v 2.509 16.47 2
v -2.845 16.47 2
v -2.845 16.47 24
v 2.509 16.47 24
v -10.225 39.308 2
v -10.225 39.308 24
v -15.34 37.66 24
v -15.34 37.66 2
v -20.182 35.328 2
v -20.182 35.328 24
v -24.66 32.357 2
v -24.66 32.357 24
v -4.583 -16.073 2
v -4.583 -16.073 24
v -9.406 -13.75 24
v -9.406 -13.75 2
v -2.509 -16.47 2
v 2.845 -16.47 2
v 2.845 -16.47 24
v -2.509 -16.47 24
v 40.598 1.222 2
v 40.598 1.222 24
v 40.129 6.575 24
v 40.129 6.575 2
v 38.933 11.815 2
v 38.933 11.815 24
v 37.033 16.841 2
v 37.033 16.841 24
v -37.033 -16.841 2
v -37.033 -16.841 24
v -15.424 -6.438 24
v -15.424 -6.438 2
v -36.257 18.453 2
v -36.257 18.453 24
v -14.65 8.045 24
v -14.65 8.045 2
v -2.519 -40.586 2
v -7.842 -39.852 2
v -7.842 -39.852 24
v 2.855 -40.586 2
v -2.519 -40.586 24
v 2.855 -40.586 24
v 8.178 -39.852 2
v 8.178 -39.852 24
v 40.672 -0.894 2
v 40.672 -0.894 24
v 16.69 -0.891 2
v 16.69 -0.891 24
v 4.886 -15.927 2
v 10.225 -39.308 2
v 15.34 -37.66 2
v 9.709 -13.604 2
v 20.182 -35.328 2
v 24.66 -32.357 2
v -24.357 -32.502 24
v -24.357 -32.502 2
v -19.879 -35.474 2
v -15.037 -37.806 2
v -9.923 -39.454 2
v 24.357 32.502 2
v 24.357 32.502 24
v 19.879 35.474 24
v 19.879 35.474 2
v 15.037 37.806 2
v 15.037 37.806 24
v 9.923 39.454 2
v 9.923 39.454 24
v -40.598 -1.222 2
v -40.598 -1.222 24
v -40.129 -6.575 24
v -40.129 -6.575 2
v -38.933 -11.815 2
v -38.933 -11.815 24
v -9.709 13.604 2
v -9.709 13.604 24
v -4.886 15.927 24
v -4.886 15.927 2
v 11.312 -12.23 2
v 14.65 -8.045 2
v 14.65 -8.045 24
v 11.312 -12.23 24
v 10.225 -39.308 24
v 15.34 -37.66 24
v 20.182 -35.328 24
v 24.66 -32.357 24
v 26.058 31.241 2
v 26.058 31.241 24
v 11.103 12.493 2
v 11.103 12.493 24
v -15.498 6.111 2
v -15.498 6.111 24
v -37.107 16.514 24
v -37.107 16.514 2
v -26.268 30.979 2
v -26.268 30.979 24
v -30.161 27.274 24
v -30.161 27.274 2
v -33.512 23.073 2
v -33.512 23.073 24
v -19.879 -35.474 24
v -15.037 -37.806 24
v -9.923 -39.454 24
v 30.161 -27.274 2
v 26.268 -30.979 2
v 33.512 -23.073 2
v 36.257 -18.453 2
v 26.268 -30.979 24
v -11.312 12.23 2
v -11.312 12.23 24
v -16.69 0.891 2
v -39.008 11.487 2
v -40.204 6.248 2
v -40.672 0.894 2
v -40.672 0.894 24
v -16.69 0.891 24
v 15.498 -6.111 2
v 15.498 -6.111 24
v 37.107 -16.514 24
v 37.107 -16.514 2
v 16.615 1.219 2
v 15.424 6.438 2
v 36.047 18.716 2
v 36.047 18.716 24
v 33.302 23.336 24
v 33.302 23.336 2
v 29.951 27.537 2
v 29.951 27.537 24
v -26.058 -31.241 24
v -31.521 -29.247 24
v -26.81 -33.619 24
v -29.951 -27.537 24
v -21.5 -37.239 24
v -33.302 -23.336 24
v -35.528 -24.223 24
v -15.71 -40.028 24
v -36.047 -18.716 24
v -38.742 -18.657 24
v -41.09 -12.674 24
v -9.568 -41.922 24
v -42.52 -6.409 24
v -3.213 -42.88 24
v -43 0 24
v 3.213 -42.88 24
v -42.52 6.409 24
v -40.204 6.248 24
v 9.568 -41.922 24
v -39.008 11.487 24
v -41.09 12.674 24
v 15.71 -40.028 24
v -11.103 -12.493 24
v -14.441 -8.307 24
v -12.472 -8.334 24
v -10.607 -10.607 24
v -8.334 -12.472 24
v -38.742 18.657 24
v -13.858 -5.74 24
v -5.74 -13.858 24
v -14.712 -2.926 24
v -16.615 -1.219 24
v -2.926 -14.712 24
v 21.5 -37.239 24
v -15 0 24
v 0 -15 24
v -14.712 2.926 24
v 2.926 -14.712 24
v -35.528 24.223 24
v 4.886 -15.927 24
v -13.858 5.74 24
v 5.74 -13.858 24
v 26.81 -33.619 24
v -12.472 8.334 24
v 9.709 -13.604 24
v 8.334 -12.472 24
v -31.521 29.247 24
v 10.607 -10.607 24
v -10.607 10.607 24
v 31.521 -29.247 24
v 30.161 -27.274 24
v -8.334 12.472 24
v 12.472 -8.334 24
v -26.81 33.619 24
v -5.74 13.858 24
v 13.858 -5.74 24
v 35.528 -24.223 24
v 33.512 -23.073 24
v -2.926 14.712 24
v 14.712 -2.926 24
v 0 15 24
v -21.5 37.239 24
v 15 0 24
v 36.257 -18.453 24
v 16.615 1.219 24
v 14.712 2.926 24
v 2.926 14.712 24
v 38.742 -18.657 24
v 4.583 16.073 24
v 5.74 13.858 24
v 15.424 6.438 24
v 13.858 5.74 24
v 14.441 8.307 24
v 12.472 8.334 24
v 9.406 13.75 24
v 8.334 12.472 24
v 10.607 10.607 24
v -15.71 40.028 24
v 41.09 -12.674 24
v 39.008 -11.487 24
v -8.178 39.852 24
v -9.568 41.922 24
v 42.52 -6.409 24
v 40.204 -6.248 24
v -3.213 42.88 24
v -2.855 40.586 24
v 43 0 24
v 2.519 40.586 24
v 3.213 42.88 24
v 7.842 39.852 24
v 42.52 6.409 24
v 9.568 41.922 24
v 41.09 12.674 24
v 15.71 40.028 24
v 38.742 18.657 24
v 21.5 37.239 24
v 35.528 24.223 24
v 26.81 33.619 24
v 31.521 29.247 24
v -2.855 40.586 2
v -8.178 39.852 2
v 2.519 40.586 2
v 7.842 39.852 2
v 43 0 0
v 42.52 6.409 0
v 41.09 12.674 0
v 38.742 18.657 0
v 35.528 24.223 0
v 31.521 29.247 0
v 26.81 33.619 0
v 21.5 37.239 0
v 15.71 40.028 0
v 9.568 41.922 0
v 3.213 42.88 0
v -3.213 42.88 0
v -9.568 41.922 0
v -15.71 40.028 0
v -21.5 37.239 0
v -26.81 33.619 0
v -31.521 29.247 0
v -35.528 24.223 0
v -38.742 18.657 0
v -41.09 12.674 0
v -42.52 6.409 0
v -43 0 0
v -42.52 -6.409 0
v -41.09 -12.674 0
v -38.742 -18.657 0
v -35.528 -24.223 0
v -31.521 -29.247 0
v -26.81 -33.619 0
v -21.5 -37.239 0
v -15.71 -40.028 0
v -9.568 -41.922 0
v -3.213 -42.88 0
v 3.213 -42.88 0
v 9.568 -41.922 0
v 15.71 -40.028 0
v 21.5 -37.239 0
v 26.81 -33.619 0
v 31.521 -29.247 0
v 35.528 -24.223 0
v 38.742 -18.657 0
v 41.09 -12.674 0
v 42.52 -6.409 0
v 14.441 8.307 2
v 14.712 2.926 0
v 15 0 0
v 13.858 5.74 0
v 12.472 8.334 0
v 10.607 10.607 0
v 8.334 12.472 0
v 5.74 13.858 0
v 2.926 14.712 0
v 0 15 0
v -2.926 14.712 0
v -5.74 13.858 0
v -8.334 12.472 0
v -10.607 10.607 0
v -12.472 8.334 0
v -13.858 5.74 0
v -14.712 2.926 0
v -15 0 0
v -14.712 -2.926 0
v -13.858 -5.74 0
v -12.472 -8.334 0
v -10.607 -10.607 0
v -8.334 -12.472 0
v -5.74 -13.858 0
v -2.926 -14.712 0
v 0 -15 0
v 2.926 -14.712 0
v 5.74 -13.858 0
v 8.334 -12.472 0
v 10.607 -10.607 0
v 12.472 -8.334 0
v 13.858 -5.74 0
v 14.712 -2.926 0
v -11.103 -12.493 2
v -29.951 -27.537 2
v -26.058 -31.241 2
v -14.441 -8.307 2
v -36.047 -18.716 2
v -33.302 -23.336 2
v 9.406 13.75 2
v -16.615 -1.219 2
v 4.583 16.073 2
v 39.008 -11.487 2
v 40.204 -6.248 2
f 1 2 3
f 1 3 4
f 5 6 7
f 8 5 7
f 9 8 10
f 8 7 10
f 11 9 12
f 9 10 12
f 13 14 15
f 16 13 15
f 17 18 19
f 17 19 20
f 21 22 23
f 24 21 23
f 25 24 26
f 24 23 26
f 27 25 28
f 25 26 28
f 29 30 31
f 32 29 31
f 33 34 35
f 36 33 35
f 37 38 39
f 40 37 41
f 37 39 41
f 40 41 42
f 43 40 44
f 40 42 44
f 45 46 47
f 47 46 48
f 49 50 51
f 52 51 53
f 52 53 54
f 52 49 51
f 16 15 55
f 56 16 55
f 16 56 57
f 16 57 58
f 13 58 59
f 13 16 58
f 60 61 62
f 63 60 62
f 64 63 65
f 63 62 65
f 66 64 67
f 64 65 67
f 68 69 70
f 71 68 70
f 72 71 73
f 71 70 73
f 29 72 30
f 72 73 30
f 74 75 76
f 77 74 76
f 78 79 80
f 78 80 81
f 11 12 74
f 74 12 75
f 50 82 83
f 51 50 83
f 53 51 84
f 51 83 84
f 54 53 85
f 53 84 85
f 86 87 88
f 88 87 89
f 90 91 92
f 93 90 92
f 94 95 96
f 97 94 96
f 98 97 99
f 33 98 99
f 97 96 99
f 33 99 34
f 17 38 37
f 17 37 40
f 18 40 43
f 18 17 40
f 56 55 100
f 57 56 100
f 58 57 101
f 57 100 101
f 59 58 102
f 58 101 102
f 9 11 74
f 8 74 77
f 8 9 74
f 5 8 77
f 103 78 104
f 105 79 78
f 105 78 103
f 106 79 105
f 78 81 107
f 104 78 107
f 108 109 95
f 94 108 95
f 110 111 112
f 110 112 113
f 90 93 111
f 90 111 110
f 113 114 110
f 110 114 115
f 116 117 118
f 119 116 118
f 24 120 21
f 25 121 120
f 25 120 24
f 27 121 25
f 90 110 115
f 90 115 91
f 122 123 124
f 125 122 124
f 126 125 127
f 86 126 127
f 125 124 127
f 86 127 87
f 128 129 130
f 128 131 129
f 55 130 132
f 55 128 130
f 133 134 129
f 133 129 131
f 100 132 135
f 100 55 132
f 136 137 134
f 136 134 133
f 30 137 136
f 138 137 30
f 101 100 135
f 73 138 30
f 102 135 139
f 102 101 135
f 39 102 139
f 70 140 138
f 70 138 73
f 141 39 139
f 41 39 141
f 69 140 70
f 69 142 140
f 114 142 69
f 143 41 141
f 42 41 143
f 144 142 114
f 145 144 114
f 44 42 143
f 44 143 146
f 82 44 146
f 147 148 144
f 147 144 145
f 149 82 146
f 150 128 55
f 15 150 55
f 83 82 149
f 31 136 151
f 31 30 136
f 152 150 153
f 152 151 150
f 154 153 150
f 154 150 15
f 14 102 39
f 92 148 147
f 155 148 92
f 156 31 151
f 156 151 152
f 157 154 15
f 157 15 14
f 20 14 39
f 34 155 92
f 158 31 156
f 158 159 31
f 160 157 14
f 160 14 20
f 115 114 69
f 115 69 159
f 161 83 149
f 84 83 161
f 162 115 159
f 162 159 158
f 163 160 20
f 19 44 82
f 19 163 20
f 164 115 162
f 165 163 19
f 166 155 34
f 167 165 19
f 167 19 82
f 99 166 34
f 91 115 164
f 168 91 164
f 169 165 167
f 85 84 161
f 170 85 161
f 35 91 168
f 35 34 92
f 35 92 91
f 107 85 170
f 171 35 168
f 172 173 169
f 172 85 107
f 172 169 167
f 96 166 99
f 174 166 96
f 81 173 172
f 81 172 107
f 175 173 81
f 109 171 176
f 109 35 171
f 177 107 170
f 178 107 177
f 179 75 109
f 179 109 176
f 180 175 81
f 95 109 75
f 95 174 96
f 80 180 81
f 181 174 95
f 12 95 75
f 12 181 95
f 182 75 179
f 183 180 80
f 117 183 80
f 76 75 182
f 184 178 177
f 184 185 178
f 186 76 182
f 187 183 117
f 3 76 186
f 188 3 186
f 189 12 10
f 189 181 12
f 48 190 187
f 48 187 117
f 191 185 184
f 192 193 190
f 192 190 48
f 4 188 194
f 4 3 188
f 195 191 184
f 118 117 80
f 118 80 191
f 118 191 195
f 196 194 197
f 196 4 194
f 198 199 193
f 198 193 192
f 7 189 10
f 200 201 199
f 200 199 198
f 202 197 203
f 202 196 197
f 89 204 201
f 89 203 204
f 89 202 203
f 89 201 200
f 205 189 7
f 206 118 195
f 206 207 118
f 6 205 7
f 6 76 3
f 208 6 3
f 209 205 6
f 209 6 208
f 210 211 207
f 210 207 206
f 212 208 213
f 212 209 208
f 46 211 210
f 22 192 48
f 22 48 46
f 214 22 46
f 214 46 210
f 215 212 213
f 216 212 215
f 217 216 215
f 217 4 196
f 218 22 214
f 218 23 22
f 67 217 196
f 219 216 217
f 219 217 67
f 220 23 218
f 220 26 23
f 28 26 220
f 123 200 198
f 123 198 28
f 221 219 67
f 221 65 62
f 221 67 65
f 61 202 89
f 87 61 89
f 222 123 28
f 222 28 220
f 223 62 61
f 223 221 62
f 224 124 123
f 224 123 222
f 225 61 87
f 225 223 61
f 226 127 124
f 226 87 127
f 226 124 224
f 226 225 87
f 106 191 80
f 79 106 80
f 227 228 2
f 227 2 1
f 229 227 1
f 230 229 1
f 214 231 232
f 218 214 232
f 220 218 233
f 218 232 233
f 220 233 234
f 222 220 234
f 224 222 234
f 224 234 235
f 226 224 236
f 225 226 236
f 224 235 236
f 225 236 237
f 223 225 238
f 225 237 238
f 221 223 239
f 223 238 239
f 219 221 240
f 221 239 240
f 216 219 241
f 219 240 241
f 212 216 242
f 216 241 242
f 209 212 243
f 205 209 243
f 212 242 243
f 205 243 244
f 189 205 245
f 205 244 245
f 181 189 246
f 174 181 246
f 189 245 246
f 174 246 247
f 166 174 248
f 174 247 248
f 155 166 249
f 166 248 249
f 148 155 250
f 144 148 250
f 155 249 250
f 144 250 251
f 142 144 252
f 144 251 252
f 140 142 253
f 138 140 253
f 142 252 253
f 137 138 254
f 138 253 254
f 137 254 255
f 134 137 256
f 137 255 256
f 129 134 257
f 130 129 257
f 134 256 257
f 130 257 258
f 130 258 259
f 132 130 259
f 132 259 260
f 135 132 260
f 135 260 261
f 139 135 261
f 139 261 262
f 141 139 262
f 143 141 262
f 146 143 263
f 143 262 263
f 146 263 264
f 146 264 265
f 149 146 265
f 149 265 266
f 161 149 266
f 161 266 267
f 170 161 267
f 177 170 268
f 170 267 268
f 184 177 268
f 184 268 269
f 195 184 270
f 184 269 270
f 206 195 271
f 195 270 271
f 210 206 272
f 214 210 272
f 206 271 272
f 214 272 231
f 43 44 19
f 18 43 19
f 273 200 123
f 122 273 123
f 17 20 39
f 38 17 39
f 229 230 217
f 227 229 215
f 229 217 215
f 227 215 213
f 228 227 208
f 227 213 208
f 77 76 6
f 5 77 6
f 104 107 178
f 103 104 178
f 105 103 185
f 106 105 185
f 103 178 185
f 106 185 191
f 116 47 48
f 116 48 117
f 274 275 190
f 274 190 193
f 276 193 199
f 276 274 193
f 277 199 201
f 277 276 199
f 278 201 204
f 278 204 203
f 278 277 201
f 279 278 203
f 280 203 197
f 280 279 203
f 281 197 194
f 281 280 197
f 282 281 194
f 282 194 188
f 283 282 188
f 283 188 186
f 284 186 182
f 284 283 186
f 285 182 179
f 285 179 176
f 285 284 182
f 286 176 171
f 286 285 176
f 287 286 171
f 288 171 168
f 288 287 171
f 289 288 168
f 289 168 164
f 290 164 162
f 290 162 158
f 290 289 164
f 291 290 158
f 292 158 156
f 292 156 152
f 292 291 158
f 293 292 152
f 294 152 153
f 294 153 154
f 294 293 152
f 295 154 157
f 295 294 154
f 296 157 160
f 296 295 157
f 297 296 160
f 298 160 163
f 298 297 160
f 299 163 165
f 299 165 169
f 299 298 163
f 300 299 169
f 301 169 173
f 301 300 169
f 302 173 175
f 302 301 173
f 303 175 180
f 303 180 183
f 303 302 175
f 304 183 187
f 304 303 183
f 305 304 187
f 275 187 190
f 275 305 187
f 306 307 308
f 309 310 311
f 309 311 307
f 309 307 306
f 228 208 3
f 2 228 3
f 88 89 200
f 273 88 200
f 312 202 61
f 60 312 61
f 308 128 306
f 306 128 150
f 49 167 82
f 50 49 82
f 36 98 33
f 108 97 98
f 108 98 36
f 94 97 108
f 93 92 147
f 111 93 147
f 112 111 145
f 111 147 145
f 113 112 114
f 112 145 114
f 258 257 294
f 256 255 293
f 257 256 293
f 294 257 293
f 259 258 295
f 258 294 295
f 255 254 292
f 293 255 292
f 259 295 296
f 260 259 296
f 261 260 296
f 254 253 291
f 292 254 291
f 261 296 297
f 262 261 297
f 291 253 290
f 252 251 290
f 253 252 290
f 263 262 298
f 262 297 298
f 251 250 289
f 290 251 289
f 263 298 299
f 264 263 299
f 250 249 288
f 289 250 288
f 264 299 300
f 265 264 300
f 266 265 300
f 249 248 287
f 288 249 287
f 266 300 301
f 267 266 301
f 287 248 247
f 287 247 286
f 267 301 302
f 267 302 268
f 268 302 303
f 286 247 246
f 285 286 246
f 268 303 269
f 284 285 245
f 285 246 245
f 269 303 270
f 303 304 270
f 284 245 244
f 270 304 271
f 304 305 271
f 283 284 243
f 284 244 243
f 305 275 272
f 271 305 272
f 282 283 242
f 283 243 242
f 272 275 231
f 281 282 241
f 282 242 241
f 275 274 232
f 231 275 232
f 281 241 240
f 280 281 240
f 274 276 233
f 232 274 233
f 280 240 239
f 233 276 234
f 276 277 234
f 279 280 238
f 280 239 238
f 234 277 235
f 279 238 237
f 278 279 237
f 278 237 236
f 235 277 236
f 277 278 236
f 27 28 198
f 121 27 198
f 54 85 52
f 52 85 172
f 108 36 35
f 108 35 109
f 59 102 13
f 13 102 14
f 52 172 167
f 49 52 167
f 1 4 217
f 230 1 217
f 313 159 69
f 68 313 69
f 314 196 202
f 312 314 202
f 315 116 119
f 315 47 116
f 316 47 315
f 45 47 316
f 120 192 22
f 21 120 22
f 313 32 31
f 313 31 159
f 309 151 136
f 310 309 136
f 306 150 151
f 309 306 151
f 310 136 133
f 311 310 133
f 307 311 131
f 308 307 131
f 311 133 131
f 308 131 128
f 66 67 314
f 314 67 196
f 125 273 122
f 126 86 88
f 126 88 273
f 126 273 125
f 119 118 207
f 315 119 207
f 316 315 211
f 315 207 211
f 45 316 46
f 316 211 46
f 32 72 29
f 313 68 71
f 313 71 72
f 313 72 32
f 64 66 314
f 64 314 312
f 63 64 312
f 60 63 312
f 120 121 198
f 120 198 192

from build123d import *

# Parameters (mm, degrees)
F0_R     = 43
F0_R_2   = 15
F1_DEPTH = 24
F3_DEPTH = 22


with BuildPart() as f1:
    # F0 (on Top) → F1 (new body)
    with BuildSketch(Plane.XY):
        Circle(F0_R)
        Circle(F0_R_2, mode=Mode.SUBTRACT)
    extrude(amount=F1_DEPTH)

    # F2 (on face) → F3 (cut)
    with BuildSketch(Plane.XY.offset(24)):
        with BuildLine():
            Line((-11.312369, 12.229999), (-26.267696, 30.978592))
            ThreePointArc((-26.267696, 30.978592), (-31.908319, 25.231136), (-36.256517, 18.453006))
            Line((-36.256517, 18.453006), (-14.650118, 8.044594))
            Line((-14.650118, 8.044594), (-11.312369, 12.229999))
        make_face()
        with BuildLine():
            Line((-4.885694, 15.927101), (-10.225269, 39.307873))
            ThreePointArc((-10.225269, 39.307873), (-17.801022, 36.576969), (-24.659534, 32.356697))
            Line((-24.659534, 32.356697), (-9.708882, 13.604377))
            Line((-9.708882, 13.604377), (-4.885694, 15.927101))
        make_face()
        with BuildLine():
            Line((2.508652, 16.469646), (7.842398, 39.851748))
            ThreePointArc((7.842398, 39.851748), (-0.168015, 40.678284), (-8.178428, 39.851748))
            Line((-8.178428, 39.851748), (-2.844682, 16.469646))
            Line((-2.844682, 16.469646), (2.508652, 16.469646))
        make_face()
        with BuildLine():
            Line((9.406129, 13.750175), (24.356781, 32.502495))
            ThreePointArc((24.356781, 32.502495), (17.49827, 36.722767), (9.922517, 39.453671))
            Line((9.922517, 39.453671), (4.582941, 16.072899))
            Line((4.582941, 16.072899), (9.406129, 13.750175))
        make_face()
        with BuildLine():
            Line((14.440607, 8.307313), (36.047006, 18.715725))
            ThreePointArc((36.047006, 18.715725), (31.698808, 25.493855), (26.058185, 31.24131))
            Line((26.058185, 31.24131), (11.102857, 12.492718))
            Line((11.102857, 12.492718), (14.440607, 8.307313))
        make_face()
        with BuildLine():
            Line((16.614945, 1.219086), (40.597679, 1.222076))
            ThreePointArc((40.597679, 1.222076), (39.621008, 9.215572), (37.03271, 16.841225))
            Line((37.03271, 16.841225), (15.423716, 6.438201))
            Line((15.423716, 6.438201), (16.614945, 1.219086))
        make_face()
        with BuildLine():
            Line((15.49849, -6.110596), (37.107484, -16.51362))
            ThreePointArc((37.107484, -16.51362), (39.695782, -8.887967), (40.672453, -0.894471))
            Line((40.672453, -0.894471), (16.689719, -0.891481))
            Line((16.689719, -0.891481), (15.49849, -6.110596))
        make_face()
        with BuildLine():
            Line((11.312369, -12.229999), (26.267696, -30.978592))
            ThreePointArc((26.267696, -30.978592), (31.908319, -25.231136), (36.256517, -18.453006))
            Line((36.256517, -18.453006), (14.650118, -8.044594))
            Line((14.650118, -8.044594), (11.312369, -12.229999))
        make_face()
        with BuildLine():
            Line((4.885694, -15.927101), (10.225269, -39.307873))
            ThreePointArc((10.225269, -39.307873), (17.801022, -36.576969), (24.659534, -32.356697))
            Line((24.659534, -32.356697), (9.708882, -13.604377))
            Line((9.708882, -13.604377), (4.885694, -15.927101))
        make_face()
        with BuildLine():
            Line((-2.508652, -16.469646), (-7.842398, -39.851748))
            ThreePointArc((-7.842398, -39.851748), (0.168015, -40.678284), (8.178428, -39.851748))
            Line((8.178428, -39.851748), (2.844682, -16.469646))
            Line((2.844682, -16.469646), (-2.508652, -16.469646))
        make_face()
        with BuildLine():
            Line((-9.406129, -13.750175), (-24.356781, -32.502495))
            ThreePointArc((-24.356781, -32.502495), (-17.49827, -36.722767), (-9.922517, -39.453671))
            Line((-9.922517, -39.453671), (-4.582941, -16.072899))
            Line((-4.582941, -16.072899), (-9.406129, -13.750175))
        make_face()
        with BuildLine():
            Line((-14.440607, -8.307313), (-36.047006, -18.715725))
            ThreePointArc((-36.047006, -18.715725), (-31.698808, -25.493855), (-26.058185, -31.24131))
            Line((-26.058185, -31.24131), (-11.102857, -12.492718))
            Line((-11.102857, -12.492718), (-14.440607, -8.307313))
        make_face()
        with BuildLine():
            Line((-16.614945, -1.219086), (-40.597679, -1.222076))
            ThreePointArc((-40.597679, -1.222076), (-39.621008, -9.215572), (-37.03271, -16.841225))
            Line((-37.03271, -16.841225), (-15.423716, -6.438201))
            Line((-15.423716, -6.438201), (-16.614945, -1.219086))
        make_face()
        with BuildLine():
            Line((-15.49849, 6.110596), (-37.107484, 16.51362))
            ThreePointArc((-37.107484, 16.51362), (-39.695782, 8.887967), (-40.672453, 0.894471))
            Line((-40.672453, 0.894471), (-16.689719, 0.891481))
            Line((-16.689719, 0.891481), (-15.49849, 6.110596))
        make_face()
    extrude(amount=-F3_DEPTH, mode=Mode.SUBTRACT)


solid = f1.part
